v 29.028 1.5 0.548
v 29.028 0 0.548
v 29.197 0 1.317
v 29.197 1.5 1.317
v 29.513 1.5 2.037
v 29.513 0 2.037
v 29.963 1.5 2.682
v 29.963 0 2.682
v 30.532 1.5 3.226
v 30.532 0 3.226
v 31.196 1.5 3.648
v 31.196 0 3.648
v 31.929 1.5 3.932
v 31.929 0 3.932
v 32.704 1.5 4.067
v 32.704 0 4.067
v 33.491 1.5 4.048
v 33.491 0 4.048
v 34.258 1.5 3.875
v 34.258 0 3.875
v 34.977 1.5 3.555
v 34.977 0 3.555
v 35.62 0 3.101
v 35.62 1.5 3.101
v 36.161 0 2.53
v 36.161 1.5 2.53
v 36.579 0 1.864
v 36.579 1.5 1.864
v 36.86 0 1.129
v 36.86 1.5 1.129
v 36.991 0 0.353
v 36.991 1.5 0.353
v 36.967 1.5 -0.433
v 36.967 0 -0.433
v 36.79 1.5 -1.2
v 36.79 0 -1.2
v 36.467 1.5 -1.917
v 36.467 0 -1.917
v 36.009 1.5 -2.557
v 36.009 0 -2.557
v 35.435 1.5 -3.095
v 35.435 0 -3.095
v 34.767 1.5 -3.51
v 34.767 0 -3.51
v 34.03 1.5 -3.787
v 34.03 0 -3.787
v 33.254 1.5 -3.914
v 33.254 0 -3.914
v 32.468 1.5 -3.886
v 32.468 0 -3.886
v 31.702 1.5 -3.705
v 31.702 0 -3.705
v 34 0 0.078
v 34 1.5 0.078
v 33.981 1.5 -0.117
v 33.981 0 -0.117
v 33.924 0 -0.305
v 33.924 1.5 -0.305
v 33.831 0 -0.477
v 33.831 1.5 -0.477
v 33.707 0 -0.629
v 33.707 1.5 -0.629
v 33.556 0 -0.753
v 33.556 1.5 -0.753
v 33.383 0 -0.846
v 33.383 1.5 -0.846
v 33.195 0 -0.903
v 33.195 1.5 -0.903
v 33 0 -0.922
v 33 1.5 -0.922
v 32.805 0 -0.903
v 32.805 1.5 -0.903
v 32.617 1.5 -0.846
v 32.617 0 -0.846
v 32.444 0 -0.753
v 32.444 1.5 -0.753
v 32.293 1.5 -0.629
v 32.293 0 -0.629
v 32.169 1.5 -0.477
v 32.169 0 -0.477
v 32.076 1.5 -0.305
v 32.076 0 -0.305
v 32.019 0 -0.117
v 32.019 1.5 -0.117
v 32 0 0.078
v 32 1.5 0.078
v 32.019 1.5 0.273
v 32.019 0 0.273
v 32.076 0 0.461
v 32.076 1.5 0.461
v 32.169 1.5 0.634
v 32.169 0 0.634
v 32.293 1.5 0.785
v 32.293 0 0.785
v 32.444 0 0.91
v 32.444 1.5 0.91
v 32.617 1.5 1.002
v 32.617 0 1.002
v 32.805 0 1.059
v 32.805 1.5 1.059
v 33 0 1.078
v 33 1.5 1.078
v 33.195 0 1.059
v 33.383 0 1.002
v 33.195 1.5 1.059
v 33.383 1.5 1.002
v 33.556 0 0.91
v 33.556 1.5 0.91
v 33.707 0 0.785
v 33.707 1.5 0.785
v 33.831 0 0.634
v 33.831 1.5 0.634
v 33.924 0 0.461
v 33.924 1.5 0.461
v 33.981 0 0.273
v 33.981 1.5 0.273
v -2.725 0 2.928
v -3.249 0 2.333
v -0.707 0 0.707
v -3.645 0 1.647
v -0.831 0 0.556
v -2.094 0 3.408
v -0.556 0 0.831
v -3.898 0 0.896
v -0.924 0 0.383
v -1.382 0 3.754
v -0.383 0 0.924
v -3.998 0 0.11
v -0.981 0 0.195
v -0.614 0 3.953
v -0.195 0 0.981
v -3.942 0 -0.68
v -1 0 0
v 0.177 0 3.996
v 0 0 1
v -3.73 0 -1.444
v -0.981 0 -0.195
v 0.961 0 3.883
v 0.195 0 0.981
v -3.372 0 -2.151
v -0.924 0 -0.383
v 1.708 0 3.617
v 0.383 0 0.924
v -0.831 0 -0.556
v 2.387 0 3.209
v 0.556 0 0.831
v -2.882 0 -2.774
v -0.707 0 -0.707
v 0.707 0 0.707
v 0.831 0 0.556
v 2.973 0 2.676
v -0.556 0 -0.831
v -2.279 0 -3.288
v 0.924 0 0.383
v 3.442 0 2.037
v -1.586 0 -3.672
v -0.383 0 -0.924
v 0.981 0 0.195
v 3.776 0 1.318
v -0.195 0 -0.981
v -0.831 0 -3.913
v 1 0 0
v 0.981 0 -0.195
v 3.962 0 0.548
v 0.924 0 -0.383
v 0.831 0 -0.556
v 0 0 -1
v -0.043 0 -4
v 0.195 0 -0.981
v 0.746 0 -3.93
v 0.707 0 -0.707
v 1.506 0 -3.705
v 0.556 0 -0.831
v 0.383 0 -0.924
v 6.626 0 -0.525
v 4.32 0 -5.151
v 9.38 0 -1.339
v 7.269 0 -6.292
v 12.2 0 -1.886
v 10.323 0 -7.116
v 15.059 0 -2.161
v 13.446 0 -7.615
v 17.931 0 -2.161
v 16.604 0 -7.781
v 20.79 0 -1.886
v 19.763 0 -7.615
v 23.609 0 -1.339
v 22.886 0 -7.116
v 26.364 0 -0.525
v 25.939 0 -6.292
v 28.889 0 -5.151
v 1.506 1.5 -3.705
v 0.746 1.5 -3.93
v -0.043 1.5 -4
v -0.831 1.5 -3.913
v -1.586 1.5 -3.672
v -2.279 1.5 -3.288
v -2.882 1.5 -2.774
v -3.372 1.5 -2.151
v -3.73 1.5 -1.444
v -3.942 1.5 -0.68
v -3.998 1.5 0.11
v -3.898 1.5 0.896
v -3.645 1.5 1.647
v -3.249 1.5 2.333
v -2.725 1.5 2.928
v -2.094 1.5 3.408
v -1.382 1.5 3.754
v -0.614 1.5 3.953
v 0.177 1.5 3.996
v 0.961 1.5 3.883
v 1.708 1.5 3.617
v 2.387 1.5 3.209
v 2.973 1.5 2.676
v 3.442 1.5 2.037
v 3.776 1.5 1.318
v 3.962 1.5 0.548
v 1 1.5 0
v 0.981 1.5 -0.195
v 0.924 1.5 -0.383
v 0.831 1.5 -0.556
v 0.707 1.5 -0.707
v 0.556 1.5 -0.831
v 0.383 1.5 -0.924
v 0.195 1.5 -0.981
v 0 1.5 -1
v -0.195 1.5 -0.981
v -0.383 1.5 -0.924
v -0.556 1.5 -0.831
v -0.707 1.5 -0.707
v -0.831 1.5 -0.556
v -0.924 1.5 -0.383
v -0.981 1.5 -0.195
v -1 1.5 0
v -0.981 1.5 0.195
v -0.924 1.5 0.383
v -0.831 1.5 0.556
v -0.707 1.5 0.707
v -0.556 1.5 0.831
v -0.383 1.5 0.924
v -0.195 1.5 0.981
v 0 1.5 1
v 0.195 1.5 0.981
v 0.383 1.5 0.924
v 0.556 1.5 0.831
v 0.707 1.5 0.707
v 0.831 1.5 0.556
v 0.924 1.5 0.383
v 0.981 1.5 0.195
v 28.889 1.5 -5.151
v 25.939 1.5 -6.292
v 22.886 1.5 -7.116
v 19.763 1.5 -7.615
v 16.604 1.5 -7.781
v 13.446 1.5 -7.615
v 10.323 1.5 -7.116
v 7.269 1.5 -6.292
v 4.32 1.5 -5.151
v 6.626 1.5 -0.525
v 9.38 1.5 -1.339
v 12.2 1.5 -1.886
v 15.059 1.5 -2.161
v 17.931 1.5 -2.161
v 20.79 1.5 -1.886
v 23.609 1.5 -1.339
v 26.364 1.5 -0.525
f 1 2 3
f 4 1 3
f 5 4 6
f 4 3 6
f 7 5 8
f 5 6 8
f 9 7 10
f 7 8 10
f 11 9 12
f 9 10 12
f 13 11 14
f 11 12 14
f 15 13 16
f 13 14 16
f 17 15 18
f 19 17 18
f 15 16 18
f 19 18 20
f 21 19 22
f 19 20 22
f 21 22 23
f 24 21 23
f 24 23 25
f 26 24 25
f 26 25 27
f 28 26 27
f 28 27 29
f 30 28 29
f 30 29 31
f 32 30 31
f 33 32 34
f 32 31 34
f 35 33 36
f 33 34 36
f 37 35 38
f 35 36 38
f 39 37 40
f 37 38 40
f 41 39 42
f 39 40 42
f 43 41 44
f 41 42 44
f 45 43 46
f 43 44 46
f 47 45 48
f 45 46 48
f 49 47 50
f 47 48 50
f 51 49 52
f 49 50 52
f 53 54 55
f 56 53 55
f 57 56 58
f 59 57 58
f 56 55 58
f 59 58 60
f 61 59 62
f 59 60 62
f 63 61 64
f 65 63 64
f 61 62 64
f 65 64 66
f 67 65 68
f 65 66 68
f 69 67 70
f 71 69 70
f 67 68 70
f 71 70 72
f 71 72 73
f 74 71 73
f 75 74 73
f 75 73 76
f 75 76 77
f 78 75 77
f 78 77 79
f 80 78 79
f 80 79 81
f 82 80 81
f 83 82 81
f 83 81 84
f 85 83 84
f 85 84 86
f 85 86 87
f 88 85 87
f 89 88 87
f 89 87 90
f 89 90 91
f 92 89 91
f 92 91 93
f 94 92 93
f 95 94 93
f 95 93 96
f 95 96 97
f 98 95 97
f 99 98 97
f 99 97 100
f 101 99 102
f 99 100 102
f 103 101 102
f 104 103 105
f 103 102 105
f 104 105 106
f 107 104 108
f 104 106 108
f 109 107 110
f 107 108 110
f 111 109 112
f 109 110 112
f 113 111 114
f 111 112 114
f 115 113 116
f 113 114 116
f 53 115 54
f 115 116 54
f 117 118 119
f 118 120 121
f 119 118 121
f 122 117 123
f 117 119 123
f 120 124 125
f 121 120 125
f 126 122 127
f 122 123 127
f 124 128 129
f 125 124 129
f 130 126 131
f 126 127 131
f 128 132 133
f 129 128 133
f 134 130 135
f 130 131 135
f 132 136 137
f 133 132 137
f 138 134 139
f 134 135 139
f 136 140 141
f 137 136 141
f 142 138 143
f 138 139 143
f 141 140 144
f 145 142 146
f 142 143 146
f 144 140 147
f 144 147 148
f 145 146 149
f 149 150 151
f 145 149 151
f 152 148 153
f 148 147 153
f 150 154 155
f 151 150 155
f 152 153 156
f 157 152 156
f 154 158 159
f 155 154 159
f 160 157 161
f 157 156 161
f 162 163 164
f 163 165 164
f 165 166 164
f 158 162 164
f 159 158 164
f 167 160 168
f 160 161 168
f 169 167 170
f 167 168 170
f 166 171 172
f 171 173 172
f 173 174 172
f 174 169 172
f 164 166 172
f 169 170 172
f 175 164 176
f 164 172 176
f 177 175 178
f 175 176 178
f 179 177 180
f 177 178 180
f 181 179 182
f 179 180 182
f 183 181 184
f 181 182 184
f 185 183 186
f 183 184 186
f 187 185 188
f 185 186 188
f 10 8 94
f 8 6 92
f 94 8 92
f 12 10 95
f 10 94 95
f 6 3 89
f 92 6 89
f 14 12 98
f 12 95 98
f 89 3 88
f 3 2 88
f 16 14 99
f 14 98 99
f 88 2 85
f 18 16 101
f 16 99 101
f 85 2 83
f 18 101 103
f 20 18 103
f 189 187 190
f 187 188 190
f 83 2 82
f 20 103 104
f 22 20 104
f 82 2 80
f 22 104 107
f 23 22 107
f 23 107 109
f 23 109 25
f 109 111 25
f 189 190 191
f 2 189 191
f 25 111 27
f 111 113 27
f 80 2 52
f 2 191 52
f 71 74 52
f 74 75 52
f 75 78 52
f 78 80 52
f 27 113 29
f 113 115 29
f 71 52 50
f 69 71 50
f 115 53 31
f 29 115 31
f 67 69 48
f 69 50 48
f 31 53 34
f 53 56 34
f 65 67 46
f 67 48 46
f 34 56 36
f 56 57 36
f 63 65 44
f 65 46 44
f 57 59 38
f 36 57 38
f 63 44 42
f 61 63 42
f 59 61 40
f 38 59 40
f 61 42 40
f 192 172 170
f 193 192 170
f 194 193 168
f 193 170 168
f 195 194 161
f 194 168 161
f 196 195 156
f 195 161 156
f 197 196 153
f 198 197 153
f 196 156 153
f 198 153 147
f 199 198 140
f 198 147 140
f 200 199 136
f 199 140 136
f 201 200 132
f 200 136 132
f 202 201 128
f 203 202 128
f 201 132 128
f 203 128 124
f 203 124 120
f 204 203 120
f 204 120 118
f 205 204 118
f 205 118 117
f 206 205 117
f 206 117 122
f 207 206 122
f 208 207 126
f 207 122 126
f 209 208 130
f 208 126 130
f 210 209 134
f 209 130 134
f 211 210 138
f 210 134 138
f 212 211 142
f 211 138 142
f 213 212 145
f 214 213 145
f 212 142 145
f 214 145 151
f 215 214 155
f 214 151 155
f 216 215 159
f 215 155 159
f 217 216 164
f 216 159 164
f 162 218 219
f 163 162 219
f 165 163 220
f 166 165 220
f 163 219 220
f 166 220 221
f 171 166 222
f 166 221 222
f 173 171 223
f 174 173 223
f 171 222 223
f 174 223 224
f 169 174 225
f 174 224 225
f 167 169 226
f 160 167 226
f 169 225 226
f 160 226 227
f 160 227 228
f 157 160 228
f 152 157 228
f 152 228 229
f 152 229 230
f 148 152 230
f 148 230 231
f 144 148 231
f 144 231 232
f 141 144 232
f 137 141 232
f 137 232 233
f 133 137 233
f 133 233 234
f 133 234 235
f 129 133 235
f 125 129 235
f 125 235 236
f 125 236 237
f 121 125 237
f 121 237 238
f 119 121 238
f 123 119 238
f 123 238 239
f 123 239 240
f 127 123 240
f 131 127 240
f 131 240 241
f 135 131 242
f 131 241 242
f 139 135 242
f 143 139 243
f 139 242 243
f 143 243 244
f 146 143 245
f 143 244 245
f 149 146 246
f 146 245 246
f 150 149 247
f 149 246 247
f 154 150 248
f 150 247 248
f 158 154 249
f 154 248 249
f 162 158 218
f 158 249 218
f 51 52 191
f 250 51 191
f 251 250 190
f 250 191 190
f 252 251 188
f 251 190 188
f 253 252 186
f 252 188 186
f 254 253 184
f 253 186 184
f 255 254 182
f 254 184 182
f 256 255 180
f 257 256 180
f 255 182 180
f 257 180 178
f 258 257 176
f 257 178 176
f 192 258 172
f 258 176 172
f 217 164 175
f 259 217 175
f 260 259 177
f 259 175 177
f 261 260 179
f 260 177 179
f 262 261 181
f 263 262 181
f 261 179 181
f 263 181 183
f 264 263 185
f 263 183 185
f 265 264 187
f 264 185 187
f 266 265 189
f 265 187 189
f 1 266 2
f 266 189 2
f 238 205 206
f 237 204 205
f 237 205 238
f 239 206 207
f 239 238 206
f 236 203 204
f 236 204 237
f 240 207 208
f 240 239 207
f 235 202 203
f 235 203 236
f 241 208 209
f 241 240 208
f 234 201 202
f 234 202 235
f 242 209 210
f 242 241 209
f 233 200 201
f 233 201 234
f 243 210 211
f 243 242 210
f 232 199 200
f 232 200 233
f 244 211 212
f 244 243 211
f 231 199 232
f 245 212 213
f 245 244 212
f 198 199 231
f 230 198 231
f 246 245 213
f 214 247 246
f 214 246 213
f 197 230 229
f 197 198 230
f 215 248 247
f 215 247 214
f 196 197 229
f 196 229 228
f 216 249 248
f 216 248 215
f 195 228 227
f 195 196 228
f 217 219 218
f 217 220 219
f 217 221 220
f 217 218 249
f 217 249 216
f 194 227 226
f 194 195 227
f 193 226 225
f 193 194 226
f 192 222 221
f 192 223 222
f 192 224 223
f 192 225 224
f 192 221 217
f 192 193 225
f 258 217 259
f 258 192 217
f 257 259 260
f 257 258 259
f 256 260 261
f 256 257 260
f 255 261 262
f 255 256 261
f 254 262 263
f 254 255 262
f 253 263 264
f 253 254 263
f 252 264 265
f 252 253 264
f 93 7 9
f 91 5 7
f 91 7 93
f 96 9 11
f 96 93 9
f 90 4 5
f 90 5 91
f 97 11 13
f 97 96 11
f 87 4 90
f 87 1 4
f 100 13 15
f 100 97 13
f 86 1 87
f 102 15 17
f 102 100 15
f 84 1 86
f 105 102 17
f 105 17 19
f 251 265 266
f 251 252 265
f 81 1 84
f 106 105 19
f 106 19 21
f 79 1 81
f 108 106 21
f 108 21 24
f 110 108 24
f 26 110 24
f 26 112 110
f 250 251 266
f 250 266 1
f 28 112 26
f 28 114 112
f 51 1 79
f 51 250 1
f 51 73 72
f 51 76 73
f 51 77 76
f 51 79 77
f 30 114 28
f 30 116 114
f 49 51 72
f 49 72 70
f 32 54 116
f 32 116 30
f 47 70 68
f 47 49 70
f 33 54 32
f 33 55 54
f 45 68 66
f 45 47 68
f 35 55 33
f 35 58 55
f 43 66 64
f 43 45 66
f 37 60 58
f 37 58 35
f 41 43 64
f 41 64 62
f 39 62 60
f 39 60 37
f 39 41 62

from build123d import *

# Parameters (mm, degrees)
BOSS_EXTRUDE1_DEPTH = 1.5
SKETCH3_R           = 1
CUT_EXTRUDE1_DEPTH  = 11.5


with BuildPart() as part:
    # Sketch1 → Boss-Extrude1 (new body)
    with BuildSketch(Plane(origin=(0, 0, 0), x_dir=(1, 0, 0), z_dir=(0, 1, 0))):
        with BuildLine():
            ThreePointArc((1.506452417, 3.705482575), (-3.464101615, -2), (3.962268252, -0.548115225))
            ThreePointArc((3.962268252, -0.548115225), (16.494990723, 2.195126577), (29.027713195, -0.548115225))
            ThreePointArc((29.027713195, -0.548115225), (36.386316352, -2.207127095), (31.702043975, 3.705482575))
            ThreePointArc((31.702043975, 3.705482575), (16.604248196, 7.78142883), (1.506452417, 3.705482575))
        make_face()
    extrude(amount=BOSS_EXTRUDE1_DEPTH)

    # Sketch3 → Cut-Extrude1 (cut)
    with BuildSketch(Plane(origin=(0, 1.5, 0), x_dir=(1, 0, 0), z_dir=(0, 1, 0))):
        with Locations((33, -0.078075295)):
            Circle(SKETCH3_R)
        Circle(SKETCH3_R)
    extrude(amount=-CUT_EXTRUDE1_DEPTH, mode=Mode.SUBTRACT)


solid = part.part
